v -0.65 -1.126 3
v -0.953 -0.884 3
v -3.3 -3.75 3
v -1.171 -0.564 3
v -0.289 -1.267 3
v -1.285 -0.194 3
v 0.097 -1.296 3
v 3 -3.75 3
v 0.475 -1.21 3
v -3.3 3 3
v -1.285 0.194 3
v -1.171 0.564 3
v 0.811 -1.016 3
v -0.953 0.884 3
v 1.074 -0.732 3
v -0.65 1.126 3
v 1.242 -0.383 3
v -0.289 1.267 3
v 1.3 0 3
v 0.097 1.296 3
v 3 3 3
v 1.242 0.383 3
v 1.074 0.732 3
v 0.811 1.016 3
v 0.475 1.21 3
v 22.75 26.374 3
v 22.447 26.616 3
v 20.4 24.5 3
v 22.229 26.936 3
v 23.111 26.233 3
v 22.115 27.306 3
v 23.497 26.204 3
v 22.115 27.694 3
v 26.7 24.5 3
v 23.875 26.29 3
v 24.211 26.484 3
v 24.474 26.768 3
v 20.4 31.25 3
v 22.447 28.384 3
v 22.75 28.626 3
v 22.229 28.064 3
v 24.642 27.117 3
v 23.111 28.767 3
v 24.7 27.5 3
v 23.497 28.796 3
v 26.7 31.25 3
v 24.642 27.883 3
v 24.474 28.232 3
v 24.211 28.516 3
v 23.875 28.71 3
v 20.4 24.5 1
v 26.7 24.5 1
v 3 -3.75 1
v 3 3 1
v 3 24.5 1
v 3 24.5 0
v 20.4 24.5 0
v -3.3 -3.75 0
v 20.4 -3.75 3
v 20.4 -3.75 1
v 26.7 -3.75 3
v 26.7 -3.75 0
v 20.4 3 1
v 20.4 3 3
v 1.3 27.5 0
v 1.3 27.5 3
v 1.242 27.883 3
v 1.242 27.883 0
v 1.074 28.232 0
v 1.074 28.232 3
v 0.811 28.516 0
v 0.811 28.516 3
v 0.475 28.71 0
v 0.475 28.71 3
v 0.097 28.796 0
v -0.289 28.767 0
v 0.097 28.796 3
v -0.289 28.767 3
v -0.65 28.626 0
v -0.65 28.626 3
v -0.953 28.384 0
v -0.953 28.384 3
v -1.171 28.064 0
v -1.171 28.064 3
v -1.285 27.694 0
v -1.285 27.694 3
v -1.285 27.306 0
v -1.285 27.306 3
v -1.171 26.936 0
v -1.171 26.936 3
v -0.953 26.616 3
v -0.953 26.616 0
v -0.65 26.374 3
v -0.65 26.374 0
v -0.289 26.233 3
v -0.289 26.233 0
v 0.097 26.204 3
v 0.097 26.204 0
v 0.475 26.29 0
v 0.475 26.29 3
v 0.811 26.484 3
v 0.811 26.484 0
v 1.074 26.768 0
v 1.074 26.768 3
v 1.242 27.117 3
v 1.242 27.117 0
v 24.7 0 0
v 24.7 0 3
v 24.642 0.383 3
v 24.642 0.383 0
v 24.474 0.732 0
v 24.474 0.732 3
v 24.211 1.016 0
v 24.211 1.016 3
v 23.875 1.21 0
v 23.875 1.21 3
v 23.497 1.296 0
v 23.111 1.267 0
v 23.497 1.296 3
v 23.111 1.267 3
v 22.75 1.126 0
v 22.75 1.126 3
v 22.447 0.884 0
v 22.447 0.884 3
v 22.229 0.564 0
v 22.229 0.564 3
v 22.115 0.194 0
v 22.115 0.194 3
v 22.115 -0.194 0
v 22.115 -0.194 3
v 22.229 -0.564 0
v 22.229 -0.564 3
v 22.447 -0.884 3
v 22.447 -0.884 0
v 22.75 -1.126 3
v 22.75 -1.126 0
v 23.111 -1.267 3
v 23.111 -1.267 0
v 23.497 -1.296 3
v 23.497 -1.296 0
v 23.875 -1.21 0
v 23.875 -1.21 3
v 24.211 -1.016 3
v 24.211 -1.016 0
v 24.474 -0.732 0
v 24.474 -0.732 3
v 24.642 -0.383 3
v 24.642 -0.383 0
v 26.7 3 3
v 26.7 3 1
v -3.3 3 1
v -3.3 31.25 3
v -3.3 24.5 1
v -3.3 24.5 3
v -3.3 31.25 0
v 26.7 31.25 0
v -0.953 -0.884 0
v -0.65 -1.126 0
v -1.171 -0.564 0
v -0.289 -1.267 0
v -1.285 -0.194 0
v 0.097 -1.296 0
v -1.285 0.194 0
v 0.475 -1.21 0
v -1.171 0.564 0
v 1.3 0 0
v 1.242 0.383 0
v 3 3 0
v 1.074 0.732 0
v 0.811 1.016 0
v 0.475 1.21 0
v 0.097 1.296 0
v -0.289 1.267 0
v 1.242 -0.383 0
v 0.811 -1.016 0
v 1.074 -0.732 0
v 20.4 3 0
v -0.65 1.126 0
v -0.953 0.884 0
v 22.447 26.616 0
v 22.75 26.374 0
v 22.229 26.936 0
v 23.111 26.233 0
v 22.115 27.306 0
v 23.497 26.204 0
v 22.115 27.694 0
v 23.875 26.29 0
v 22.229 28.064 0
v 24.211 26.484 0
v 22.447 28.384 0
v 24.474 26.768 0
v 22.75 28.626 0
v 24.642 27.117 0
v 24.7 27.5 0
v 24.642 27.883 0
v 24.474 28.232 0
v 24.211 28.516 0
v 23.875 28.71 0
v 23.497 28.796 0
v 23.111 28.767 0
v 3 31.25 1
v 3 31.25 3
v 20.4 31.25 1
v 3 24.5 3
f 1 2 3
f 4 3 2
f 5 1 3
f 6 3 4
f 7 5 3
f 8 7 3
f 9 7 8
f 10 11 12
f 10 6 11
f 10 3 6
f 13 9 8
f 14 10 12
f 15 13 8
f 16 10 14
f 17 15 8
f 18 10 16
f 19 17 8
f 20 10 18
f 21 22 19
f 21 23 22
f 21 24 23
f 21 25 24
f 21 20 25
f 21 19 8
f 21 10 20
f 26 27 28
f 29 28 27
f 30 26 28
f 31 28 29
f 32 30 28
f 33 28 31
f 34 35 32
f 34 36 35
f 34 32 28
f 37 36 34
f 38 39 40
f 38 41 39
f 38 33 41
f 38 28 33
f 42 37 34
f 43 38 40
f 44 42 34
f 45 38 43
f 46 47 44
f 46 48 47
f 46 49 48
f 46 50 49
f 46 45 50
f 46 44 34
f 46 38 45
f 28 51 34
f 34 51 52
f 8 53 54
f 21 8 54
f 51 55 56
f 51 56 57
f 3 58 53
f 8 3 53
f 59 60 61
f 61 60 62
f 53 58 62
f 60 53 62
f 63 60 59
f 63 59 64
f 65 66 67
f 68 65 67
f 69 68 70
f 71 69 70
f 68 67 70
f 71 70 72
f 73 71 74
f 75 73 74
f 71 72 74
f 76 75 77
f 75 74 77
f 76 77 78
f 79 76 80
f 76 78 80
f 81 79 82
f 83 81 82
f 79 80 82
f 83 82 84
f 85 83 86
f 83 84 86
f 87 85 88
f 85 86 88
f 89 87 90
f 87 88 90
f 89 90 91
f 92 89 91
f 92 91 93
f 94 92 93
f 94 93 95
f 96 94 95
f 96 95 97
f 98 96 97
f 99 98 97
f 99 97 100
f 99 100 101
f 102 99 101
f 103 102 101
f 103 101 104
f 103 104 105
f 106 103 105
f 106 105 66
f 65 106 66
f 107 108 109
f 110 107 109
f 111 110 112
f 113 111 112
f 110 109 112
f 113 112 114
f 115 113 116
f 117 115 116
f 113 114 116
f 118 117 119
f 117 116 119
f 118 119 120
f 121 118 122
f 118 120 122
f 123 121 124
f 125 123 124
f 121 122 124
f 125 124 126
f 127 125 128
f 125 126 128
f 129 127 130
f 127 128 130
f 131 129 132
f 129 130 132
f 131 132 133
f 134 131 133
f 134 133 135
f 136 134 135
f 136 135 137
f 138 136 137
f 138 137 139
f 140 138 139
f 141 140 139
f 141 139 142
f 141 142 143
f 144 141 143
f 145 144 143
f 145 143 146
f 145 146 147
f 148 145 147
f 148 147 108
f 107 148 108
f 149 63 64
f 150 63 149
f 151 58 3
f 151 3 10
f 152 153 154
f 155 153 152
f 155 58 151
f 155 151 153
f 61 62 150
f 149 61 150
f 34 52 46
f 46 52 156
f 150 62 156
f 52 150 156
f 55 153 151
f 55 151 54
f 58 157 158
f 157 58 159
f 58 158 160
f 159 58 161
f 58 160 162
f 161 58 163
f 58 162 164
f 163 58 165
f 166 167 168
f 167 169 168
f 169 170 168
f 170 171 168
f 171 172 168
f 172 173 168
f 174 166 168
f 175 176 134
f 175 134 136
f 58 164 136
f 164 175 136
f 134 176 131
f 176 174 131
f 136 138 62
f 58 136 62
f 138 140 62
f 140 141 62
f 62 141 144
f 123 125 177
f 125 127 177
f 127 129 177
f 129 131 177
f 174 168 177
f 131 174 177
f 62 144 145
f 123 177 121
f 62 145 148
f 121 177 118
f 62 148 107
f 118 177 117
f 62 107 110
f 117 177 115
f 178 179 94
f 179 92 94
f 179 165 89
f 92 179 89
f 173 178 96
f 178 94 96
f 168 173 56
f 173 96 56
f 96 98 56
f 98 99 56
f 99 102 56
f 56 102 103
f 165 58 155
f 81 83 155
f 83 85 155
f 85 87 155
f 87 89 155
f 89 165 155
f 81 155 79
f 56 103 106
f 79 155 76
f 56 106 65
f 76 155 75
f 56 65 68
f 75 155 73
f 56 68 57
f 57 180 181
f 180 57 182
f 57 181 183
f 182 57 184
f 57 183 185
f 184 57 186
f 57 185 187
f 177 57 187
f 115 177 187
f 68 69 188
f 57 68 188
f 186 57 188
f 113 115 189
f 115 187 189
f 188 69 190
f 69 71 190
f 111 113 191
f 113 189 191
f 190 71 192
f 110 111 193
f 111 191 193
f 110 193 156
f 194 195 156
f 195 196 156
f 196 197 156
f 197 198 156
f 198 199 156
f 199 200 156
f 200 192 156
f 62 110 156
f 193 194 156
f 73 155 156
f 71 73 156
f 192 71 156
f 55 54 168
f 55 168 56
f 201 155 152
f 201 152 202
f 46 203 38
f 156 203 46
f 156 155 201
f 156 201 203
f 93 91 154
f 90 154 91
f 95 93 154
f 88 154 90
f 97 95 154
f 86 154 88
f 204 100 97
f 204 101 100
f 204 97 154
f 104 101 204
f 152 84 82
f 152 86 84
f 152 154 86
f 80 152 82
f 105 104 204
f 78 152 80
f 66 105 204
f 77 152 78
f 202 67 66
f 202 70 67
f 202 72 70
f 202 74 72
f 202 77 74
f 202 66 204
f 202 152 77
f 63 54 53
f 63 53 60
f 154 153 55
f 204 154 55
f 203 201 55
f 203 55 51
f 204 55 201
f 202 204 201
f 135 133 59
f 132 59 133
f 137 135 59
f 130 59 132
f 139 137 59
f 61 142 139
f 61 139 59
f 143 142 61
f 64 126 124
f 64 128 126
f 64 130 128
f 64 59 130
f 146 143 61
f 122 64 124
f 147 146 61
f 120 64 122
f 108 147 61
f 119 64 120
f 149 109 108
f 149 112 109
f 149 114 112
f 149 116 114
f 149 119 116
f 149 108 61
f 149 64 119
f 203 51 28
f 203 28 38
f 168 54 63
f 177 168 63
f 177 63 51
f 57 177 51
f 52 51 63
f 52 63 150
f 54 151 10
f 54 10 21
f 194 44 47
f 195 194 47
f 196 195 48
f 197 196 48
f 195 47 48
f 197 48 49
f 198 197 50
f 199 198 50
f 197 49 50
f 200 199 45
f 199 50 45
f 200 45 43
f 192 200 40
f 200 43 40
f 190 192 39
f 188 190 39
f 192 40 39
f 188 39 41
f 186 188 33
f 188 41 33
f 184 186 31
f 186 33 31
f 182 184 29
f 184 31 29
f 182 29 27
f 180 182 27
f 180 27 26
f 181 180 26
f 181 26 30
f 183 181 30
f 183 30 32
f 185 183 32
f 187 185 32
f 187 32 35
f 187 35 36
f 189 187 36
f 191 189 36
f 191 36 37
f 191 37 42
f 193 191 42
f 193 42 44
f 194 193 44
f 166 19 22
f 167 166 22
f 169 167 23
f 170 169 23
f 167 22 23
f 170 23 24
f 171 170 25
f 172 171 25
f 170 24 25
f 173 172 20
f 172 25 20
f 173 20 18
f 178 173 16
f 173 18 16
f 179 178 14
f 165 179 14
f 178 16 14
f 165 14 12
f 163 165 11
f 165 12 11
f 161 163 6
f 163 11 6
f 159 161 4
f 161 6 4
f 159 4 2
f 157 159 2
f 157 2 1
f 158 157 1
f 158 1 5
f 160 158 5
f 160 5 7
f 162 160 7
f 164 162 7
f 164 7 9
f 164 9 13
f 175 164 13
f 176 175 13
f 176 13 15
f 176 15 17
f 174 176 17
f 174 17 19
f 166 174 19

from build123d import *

# Parameters (mm, degrees)
F1_W     = 30
F1_H     = 35
F2_DEPTH = 1
F3_W     = 6.3
F3_H     = 6.75
F4_DEPTH = 2
F5_R     = 1.3
F6_DEPTH = 3.001
F7_W     = 17.4
F7_H     = 21.5
F8_DEPTH = 1.001


with BuildPart() as f2:
    # F1 (on Top) → F2 (new body)
    with BuildSketch(Plane.XY):
        with Locations((11.7, 13.75)):
            Rectangle(F1_W, F1_H)
    extrude(amount=F2_DEPTH)

    # F3 (on face) → F4 (join)
    with BuildSketch(Plane.XY.offset(1)):
        with Locations((-0.15, 27.875)):
            Rectangle(F3_W, F3_H)
        with Locations((23.55, 27.875)):
            Rectangle(F3_W, F3_H)
        with Locations((23.55, -0.375)):
            Rectangle(F3_W, F3_H)
        with Locations((-0.15, -0.375)):
            Rectangle(F3_W, F3_H)
    extrude(amount=F4_DEPTH)

    # F5 (on face) → F6 (cut, through all)
    with BuildSketch(Plane.XY.offset(3)):
        with Locations((0, 27.5)):
            Circle(F5_R)
        with Locations((23.4, 27.5)):
            Circle(F5_R)
        with Locations((23.4, 0)):
            Circle(F5_R)
        Circle(F5_R)
    extrude(amount=-F6_DEPTH, mode=Mode.SUBTRACT)

    # F7 (on face) → F8 (cut, through all)
    with BuildSketch(Plane.XY.offset(1)):
        with Locations((11.7, 13.75)):
            Rectangle(F7_W, F7_H)
    extrude(amount=-F8_DEPTH, mode=Mode.SUBTRACT)


solid = f2.part
